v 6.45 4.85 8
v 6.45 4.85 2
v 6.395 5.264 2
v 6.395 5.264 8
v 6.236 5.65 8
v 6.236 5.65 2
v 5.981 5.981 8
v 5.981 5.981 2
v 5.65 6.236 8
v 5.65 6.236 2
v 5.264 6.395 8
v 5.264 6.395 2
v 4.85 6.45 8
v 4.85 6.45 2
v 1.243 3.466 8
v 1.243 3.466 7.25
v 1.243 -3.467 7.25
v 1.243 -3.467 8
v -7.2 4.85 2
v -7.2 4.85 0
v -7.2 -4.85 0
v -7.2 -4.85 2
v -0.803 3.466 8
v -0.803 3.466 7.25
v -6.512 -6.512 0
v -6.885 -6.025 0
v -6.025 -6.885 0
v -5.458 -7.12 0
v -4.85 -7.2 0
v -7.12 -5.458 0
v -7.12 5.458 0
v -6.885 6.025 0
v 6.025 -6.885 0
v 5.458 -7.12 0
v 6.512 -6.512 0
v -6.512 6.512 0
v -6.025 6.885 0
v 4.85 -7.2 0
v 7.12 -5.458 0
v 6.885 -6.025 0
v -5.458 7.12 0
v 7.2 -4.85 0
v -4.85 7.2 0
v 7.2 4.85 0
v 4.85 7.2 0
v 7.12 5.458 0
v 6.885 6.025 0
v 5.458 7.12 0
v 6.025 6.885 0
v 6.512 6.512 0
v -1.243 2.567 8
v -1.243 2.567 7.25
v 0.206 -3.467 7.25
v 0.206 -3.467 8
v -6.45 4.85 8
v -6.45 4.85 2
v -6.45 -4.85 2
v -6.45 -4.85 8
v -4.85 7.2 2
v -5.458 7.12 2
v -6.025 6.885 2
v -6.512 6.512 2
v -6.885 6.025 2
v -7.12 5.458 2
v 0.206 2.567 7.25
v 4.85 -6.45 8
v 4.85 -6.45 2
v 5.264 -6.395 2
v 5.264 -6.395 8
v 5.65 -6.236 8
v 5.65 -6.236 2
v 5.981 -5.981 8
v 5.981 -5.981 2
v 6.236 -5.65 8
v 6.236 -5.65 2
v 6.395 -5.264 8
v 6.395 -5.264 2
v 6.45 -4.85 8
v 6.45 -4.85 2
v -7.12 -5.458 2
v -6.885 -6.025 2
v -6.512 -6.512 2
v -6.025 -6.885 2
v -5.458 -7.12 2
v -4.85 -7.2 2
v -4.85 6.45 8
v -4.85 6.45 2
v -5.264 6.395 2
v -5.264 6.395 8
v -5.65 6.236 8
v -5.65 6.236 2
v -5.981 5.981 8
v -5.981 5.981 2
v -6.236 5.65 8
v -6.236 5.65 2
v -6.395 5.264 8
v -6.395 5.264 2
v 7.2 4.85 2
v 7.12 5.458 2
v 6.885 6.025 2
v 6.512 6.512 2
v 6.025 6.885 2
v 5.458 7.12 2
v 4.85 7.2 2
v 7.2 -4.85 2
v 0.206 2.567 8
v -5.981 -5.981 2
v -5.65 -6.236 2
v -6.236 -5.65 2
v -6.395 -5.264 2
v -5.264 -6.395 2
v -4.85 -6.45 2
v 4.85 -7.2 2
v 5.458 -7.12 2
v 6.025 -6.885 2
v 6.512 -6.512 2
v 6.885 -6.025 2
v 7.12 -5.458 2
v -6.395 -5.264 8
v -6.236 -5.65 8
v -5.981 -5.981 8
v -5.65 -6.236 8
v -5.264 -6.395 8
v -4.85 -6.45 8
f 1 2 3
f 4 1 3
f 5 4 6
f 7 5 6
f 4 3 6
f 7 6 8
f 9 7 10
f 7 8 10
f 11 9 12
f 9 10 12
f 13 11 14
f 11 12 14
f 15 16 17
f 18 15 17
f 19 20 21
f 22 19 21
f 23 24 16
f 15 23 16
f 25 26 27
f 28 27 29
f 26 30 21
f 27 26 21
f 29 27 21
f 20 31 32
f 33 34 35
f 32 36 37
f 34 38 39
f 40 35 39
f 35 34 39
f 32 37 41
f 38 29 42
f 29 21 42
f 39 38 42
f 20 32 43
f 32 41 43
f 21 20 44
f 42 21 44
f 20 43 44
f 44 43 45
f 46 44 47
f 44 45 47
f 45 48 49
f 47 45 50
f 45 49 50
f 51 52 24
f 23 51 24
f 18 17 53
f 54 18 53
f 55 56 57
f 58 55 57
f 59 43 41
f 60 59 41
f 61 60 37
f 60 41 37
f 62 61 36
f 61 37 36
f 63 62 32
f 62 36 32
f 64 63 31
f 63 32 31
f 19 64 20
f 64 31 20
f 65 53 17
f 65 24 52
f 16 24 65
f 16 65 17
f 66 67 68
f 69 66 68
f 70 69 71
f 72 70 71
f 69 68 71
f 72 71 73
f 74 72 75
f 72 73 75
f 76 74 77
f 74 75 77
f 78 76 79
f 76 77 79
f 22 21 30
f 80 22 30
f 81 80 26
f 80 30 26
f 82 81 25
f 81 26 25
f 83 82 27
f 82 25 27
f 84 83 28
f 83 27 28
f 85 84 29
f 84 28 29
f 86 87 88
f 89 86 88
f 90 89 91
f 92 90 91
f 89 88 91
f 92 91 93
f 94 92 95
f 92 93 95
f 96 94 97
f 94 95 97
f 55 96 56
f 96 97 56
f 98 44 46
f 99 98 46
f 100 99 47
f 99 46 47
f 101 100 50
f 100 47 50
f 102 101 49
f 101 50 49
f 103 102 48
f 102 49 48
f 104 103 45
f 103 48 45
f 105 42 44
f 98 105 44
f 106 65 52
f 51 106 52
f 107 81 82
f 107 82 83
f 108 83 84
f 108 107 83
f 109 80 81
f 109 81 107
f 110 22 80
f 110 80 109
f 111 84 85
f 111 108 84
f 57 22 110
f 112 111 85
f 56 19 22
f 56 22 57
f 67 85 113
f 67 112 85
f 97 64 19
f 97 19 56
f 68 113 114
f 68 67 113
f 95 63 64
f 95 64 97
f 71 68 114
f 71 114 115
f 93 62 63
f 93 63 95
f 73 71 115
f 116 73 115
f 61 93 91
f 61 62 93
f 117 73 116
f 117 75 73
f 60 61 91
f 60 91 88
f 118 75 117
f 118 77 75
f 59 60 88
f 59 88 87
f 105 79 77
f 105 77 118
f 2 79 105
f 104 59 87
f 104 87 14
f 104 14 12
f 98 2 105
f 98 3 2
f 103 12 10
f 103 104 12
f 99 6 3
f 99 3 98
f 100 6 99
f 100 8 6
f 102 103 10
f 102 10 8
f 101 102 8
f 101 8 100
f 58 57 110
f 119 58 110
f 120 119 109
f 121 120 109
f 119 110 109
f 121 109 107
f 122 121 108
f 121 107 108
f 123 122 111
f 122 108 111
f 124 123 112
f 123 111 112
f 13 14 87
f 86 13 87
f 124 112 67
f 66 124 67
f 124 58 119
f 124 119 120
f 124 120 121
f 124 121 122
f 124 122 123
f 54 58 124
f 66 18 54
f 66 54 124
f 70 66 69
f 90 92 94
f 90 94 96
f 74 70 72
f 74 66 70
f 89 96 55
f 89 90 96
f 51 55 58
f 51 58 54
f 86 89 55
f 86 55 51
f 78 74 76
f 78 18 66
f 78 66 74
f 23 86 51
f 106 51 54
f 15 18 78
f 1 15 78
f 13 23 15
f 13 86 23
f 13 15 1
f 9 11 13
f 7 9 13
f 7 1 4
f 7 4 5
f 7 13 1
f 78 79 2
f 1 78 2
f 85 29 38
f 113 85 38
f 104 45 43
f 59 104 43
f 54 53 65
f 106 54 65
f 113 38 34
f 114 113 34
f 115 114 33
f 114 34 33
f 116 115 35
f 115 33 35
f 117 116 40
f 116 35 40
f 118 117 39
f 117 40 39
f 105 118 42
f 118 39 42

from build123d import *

# Parameters (mm, degrees)
F1_DEPTH = 2
F2_DEPTH = 8
F3_DEPTH = 7.25


with BuildPart() as f1:
    # F0 (on Top) → F1 (new body)
    with BuildSketch(Plane.XY):
        with BuildLine():
            Line((4.85, 7.2), (-4.85, 7.2))
            ThreePointArc((-4.85, 7.2), (-6.511701, 6.511701), (-7.2, 4.85))
            Line((-7.2, 4.85), (-7.2, -4.85))
            ThreePointArc((-7.2, -4.85), (-6.511701, -6.511701), (-4.85, -7.2))
            Line((-4.85, -7.2), (4.85, -7.2))
            ThreePointArc((4.85, -7.2), (6.511701, -6.511701), (7.2, -4.85))
            Line((7.2, -4.85), (7.2, 4.85))
            ThreePointArc((7.2, 4.85), (6.511701, 6.511701), (4.85, 7.2))
        make_face()
        with BuildLine():
            ThreePointArc((6.45, -4.85), (5.981371, -5.981371), (4.85, -6.45))
            Line((4.85, -6.45), (-4.85, -6.45))
            ThreePointArc((-4.85, -6.45), (-5.981371, -5.981371), (-6.45, -4.85))
            Line((-6.45, -4.85), (-6.45, 4.85))
            ThreePointArc((-6.45, 4.85), (-5.981371, 5.981371), (-4.85, 6.45))
            Line((-4.85, 6.45), (4.85, 6.45))
            ThreePointArc((4.85, 6.45), (5.981371, 5.981371), (6.45, 4.85))
            Line((6.45, 4.85), (6.45, -4.85))
        make_face(mode=Mode.SUBTRACT)
    extrude(amount=F1_DEPTH)

    # F0 (on Top) → F2 (join)
    with BuildSketch(Plane.XY):
        with BuildLine():
            Line((-4.85, -6.45), (4.85, -6.45))
            ThreePointArc((4.85, -6.45), (5.981371, -5.981371), (6.45, -4.85))
            Line((6.45, -4.85), (6.45, 4.85))
            ThreePointArc((6.45, 4.85), (5.981371, 5.981371), (4.85, 6.45))
            Line((4.85, 6.45), (-4.85, 6.45))
            ThreePointArc((-4.85, 6.45), (-5.981371, 5.981371), (-6.45, 4.85))
            Line((-6.45, 4.85), (-6.45, -4.85))
            ThreePointArc((-6.45, -4.85), (-5.981371, -5.981371), (-4.85, -6.45))
        make_face()
        Polygon((1.243107, -3.466724), (0.205538, -3.466724), (0.205538, 2.567429), (-1.243232, 2.567429), (-0.803342, 3.466336), (1.243107, 3.466336), align=None, mode=Mode.SUBTRACT)
    extrude(amount=F2_DEPTH)

    # F0 (on Top) → F3 (join)
    with BuildSketch(Plane.XY):
        Polygon((0.205538, 2.567429), (0.205538, -3.466724), (1.243107, -3.466724), (1.243107, 3.466336), (-0.803342, 3.466336), (-1.243232, 2.567429), align=None)
    extrude(amount=F3_DEPTH)


solid = f1.part
